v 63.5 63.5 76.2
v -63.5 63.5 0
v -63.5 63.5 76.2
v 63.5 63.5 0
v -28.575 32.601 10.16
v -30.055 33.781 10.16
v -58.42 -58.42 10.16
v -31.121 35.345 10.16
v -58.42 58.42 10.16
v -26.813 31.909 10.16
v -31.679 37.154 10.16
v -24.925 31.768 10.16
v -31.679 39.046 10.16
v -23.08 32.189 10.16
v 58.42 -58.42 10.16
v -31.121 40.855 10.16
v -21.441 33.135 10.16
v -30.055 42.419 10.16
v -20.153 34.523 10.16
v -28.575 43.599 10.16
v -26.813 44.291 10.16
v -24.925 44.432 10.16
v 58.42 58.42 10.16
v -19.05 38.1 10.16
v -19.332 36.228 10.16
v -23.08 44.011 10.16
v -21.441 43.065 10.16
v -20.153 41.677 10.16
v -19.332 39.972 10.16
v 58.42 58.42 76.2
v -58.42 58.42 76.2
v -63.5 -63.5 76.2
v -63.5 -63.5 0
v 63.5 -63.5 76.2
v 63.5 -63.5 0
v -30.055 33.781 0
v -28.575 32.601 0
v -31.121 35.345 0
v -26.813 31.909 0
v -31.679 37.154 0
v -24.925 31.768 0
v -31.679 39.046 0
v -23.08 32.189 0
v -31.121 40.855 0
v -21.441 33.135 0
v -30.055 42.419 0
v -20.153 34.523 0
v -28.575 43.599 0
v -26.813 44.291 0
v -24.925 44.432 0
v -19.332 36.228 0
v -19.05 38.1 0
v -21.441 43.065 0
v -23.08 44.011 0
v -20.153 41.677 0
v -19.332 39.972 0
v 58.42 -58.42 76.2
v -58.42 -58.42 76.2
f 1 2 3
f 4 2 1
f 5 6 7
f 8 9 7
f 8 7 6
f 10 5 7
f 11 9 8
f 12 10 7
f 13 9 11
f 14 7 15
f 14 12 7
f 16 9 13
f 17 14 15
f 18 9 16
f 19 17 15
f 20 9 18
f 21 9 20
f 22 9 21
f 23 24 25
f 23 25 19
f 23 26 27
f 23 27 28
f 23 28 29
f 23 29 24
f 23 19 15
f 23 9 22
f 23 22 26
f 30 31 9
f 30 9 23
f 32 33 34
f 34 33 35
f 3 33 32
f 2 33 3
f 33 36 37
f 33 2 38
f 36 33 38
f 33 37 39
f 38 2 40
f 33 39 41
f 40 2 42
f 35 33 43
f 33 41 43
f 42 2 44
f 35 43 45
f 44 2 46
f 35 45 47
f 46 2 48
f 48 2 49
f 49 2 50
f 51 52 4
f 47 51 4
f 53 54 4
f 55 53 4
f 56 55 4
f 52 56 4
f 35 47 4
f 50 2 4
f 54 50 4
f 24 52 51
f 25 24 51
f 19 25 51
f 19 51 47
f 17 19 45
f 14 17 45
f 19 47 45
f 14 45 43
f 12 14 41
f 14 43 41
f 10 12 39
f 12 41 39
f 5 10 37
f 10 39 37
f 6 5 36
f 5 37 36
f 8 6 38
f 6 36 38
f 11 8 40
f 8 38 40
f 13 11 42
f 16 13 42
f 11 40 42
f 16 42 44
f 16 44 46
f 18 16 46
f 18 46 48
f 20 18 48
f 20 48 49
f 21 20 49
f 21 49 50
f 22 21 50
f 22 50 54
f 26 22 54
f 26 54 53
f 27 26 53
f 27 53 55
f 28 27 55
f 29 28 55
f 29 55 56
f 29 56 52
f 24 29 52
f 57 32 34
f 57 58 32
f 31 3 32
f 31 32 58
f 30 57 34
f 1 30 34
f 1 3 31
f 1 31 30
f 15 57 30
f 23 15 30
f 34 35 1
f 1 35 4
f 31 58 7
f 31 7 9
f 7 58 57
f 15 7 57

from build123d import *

# Parameters (mm, degrees)
F0_W     = 127
F0_H     = 127
F1_DEPTH = 76.2
F2_W     = 116.84
F2_H     = 116.84
F3_DEPTH = 66.04
F4_R     = 6.35
F5_DEPTH = 76.201


with BuildPart() as f1:
    # F0 (on Top) → F1 (new body)
    with BuildSketch(Plane.XY):
        Rectangle(F0_W, F0_H)
    extrude(amount=F1_DEPTH)

    # F2 (on face) → F3 (cut)
    with BuildSketch(Plane.XY.offset(76.2)):
        Rectangle(F2_W, F2_H)
    extrude(amount=-F3_DEPTH, mode=Mode.SUBTRACT)

    # F4 (on face) → F5 (cut, through all)
    with BuildSketch(Plane(origin=(0, 0, 0), x_dir=(1, 0, 0), z_dir=(0, 0, -1))):
        with Locations((-25.4, -38.1)):
            Circle(F4_R)
    extrude(amount=-F5_DEPTH, mode=Mode.SUBTRACT)


solid = f1.part
